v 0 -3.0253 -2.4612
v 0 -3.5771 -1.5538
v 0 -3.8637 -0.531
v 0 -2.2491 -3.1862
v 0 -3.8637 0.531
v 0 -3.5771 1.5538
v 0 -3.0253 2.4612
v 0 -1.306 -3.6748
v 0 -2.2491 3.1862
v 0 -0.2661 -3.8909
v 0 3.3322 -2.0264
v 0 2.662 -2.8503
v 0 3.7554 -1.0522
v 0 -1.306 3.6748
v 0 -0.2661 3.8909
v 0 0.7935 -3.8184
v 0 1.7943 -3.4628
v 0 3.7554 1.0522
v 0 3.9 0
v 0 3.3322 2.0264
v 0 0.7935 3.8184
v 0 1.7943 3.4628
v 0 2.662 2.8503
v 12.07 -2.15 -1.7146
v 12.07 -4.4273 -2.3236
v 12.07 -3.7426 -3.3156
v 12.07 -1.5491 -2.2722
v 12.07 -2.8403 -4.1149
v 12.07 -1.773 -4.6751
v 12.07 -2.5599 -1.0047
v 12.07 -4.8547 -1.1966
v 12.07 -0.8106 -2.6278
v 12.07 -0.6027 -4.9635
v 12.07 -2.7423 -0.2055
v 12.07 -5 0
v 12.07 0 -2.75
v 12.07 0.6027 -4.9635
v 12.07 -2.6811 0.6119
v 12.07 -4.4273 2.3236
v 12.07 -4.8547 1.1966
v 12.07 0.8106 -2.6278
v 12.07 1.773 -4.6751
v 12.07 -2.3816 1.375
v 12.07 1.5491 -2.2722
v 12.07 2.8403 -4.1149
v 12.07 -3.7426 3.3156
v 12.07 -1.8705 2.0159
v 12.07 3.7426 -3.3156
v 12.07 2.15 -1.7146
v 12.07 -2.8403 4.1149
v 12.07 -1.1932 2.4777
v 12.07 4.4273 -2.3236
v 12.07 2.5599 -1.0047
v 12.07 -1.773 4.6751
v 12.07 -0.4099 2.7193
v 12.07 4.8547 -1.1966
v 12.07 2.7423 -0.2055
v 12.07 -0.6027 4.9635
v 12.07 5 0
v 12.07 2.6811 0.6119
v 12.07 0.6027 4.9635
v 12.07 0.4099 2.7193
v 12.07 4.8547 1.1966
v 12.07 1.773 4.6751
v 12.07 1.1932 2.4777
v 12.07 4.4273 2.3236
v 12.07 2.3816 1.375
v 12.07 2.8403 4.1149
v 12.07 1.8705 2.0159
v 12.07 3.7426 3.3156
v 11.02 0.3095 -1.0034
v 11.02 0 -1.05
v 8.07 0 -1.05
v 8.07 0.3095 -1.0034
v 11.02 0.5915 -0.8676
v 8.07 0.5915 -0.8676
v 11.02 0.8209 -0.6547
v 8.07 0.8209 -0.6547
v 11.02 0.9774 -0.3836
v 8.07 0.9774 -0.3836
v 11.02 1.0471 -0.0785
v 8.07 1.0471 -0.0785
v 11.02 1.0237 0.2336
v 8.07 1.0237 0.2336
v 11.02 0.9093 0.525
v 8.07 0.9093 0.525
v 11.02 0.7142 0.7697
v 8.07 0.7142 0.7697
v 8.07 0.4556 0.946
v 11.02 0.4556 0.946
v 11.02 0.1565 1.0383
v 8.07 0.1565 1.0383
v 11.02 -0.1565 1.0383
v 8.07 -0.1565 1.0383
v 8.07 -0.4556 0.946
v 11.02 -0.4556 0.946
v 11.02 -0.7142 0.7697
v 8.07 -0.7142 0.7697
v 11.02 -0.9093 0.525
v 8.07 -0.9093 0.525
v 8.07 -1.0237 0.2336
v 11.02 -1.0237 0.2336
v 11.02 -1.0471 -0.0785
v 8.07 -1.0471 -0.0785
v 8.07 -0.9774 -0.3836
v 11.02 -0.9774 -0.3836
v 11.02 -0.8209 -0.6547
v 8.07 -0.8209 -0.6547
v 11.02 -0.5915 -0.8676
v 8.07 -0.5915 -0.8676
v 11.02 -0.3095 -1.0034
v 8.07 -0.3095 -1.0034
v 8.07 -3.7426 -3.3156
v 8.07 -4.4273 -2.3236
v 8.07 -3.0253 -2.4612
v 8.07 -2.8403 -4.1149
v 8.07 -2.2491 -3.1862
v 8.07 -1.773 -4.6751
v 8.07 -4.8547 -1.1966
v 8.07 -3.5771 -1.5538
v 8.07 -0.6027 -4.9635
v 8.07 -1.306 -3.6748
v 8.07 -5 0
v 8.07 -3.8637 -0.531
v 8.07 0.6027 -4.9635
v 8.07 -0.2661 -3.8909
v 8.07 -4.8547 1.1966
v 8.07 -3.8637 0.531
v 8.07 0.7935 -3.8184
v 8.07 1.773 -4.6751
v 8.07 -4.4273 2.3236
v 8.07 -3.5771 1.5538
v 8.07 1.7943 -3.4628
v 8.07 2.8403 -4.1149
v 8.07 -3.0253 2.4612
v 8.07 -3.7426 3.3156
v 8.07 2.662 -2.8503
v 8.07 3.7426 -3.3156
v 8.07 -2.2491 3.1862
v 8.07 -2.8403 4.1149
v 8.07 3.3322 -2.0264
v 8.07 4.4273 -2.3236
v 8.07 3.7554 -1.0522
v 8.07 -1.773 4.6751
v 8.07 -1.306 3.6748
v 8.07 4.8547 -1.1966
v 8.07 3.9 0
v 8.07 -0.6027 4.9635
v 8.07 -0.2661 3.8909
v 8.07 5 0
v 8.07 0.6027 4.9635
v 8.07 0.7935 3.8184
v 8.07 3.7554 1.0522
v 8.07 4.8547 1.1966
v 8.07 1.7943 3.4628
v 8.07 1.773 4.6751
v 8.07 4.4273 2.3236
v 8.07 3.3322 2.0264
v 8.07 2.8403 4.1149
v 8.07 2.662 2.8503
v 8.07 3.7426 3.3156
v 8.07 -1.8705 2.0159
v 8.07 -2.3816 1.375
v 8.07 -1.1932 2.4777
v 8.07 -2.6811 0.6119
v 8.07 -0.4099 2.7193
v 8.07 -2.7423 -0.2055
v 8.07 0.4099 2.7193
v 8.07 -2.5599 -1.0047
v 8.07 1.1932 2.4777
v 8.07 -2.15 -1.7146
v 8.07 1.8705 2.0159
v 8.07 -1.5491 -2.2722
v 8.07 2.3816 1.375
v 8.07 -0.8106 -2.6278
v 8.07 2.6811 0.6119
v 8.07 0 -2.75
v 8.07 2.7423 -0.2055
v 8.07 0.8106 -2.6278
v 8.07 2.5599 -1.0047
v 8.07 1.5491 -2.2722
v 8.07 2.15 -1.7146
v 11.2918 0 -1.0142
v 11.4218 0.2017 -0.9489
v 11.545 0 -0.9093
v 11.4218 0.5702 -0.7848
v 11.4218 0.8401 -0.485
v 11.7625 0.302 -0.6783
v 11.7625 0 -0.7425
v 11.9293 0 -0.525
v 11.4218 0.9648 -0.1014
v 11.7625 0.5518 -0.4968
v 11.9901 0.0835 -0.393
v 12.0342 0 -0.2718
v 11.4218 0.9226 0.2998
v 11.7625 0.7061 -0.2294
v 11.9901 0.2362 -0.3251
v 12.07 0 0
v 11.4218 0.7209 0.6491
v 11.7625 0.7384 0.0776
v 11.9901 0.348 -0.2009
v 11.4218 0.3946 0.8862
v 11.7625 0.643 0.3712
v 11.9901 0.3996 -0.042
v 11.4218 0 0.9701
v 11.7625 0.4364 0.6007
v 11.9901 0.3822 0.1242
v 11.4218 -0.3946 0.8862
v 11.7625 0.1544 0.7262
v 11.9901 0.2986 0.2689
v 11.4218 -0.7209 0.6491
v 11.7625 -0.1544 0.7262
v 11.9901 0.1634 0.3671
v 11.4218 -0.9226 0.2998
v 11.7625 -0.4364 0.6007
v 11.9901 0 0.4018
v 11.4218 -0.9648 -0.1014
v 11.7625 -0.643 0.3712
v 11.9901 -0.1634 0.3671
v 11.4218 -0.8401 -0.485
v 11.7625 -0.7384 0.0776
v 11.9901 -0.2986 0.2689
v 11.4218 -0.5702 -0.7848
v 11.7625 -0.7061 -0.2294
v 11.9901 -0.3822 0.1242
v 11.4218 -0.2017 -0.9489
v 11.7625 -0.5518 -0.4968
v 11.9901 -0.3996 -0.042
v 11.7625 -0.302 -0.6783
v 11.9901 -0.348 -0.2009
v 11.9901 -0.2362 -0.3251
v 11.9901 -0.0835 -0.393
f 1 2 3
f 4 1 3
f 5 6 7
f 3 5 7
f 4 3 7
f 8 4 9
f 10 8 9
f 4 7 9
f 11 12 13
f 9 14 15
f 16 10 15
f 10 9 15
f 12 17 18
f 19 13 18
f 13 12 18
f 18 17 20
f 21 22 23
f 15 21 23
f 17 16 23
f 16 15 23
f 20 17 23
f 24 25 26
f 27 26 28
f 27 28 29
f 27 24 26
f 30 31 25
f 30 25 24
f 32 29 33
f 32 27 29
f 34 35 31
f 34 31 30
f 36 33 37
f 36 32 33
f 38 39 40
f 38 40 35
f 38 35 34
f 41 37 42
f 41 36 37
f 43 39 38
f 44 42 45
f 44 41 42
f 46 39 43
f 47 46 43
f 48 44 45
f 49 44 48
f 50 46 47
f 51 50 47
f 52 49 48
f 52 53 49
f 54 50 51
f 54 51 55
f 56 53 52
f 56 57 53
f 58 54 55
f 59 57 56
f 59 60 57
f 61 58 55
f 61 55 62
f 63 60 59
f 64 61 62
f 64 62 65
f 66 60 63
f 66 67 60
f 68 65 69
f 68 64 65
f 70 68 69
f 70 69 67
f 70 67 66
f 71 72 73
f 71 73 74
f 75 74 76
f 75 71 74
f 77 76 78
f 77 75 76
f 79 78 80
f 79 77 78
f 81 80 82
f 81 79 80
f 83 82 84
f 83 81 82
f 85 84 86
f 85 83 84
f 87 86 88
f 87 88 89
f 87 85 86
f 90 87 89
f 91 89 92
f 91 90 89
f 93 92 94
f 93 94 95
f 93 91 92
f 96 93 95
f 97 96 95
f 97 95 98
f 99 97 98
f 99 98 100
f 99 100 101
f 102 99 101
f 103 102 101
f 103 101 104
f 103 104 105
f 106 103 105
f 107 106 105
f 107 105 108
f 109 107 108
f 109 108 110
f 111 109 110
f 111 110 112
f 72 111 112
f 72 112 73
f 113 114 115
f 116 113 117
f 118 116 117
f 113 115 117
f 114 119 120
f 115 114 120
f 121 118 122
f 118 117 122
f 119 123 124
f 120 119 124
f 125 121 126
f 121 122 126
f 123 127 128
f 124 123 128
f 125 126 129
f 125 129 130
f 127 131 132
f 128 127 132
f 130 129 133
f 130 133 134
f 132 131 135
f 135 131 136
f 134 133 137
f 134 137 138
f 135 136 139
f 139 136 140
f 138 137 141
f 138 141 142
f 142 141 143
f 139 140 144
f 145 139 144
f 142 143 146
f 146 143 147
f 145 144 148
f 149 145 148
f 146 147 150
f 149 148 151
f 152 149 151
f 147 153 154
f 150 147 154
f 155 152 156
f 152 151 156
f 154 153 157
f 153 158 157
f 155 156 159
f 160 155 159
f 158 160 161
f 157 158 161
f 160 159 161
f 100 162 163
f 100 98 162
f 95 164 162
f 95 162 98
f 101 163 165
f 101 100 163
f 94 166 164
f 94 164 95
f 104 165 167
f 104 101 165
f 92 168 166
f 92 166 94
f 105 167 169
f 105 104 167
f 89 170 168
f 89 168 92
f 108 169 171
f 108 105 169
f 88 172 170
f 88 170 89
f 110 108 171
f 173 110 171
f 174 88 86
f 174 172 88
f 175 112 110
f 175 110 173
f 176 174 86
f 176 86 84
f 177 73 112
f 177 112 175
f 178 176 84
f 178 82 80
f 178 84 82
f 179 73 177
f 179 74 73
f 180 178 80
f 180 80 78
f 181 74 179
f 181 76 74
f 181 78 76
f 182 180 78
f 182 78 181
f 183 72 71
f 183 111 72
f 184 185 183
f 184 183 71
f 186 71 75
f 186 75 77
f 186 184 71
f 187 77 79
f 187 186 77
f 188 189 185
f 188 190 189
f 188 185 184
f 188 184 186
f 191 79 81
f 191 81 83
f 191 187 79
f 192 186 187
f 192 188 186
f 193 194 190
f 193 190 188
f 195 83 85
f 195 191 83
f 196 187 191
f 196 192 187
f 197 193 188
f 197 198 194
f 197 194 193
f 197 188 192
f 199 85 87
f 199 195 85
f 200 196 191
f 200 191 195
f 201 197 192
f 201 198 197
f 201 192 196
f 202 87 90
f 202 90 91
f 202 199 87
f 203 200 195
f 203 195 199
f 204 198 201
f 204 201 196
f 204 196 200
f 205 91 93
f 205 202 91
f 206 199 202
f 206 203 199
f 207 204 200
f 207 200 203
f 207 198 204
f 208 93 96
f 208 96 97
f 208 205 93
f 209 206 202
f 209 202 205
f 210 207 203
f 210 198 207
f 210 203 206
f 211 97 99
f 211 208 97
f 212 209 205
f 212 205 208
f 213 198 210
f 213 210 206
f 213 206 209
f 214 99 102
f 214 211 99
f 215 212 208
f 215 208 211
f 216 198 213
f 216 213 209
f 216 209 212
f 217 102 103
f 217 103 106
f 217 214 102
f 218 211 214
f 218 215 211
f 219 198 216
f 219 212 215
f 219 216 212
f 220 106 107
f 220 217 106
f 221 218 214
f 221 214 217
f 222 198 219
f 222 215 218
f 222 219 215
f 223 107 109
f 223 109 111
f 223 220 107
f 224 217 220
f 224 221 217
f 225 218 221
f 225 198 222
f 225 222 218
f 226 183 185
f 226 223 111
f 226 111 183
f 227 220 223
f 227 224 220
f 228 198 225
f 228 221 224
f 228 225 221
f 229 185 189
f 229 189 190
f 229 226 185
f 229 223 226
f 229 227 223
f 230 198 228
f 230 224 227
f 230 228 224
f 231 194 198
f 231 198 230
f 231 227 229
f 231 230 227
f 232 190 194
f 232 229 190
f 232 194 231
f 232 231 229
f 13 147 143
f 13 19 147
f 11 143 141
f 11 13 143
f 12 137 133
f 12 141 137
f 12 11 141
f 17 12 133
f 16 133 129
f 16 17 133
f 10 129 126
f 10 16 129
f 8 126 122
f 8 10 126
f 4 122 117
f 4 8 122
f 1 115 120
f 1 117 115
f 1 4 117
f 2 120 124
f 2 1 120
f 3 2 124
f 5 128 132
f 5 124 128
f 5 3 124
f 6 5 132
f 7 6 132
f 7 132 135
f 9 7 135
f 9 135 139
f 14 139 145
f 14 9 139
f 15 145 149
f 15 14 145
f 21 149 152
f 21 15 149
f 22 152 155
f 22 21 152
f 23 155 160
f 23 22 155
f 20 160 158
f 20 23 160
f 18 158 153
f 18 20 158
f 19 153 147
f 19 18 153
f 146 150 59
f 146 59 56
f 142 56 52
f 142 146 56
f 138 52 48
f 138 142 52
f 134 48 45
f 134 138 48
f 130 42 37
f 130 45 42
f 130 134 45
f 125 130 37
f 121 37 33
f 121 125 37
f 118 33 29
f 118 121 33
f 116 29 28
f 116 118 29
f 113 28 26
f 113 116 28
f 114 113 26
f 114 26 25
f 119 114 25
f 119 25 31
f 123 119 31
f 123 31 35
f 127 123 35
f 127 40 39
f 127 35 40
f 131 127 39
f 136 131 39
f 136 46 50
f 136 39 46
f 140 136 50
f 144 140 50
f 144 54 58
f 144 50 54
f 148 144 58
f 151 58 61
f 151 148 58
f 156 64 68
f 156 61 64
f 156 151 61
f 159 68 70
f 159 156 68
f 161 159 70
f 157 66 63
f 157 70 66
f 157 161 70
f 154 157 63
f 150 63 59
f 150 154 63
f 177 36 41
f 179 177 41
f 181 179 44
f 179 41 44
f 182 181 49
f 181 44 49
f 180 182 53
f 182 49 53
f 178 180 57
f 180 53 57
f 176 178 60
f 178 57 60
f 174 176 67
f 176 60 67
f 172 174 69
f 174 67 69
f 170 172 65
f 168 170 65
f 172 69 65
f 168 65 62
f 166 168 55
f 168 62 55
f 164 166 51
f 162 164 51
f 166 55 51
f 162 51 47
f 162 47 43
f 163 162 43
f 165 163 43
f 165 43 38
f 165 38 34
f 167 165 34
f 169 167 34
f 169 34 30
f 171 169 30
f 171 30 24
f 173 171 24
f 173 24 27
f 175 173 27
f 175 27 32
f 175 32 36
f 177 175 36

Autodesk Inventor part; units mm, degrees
ref_plane "YZ Plane" through (0, 0, 0) normal (1, 0, 0) x (0, 1, 0)
ref_plane "XZ Plane" through (0, 0, 0) normal (0, 1, 0) x (-1, 0, 0)
ref_plane "XY Plane" through (0, 0, 0) normal (0, 0, 1) x (1, 0, 0)
sketch "Sketch1" plane through (0, 0, 0) normal (0, 0, 1) x (1, 0, 0)
  line L0 (0, 0) -> (12.07, 0)
  line L1 (12.07, 0) -> (12.07, 5)
  line L2 (12.07, 5) -> (8.07, 5)
  line L3 (8.07, 5) -> (8.07, 3.9)
  line L4 (8.07, 3.9) -> (0, 3.9)
  line L5 (0, 3.9) -> (0, 0)
  dimension "d0" = 7.8
  dimension "d1" = 8.07
  dimension "d2" = 4
  dimension "d3" = 10
revolve "Revolution1" add sketch "Sketch1" angle 360 about axis through (0, 0, 0) along (1, 0, 0)
thread "Thread1" size "M8x1.25" class "6g" standard "ANSI Metric M Profile" length 5.17 offset 2.9
sketch "Sketch2" plane through (12.07, 0, 0) normal (1, 0, 0) x (0, 0, -1)
  circle A0 centre (0, 0) radius 2.75
  circle A1 centre (0, 0) radius 1.05
  dimension "d7" = 5.5
  dimension "d8" = 2.1
extrude "Extrusion1" cut sketch "Sketch2" against normal blind 4
fillet "Fillet1" radius 1.05 1 edges at (12.07, 0, 1.05)
properties part number "DC Jack"
